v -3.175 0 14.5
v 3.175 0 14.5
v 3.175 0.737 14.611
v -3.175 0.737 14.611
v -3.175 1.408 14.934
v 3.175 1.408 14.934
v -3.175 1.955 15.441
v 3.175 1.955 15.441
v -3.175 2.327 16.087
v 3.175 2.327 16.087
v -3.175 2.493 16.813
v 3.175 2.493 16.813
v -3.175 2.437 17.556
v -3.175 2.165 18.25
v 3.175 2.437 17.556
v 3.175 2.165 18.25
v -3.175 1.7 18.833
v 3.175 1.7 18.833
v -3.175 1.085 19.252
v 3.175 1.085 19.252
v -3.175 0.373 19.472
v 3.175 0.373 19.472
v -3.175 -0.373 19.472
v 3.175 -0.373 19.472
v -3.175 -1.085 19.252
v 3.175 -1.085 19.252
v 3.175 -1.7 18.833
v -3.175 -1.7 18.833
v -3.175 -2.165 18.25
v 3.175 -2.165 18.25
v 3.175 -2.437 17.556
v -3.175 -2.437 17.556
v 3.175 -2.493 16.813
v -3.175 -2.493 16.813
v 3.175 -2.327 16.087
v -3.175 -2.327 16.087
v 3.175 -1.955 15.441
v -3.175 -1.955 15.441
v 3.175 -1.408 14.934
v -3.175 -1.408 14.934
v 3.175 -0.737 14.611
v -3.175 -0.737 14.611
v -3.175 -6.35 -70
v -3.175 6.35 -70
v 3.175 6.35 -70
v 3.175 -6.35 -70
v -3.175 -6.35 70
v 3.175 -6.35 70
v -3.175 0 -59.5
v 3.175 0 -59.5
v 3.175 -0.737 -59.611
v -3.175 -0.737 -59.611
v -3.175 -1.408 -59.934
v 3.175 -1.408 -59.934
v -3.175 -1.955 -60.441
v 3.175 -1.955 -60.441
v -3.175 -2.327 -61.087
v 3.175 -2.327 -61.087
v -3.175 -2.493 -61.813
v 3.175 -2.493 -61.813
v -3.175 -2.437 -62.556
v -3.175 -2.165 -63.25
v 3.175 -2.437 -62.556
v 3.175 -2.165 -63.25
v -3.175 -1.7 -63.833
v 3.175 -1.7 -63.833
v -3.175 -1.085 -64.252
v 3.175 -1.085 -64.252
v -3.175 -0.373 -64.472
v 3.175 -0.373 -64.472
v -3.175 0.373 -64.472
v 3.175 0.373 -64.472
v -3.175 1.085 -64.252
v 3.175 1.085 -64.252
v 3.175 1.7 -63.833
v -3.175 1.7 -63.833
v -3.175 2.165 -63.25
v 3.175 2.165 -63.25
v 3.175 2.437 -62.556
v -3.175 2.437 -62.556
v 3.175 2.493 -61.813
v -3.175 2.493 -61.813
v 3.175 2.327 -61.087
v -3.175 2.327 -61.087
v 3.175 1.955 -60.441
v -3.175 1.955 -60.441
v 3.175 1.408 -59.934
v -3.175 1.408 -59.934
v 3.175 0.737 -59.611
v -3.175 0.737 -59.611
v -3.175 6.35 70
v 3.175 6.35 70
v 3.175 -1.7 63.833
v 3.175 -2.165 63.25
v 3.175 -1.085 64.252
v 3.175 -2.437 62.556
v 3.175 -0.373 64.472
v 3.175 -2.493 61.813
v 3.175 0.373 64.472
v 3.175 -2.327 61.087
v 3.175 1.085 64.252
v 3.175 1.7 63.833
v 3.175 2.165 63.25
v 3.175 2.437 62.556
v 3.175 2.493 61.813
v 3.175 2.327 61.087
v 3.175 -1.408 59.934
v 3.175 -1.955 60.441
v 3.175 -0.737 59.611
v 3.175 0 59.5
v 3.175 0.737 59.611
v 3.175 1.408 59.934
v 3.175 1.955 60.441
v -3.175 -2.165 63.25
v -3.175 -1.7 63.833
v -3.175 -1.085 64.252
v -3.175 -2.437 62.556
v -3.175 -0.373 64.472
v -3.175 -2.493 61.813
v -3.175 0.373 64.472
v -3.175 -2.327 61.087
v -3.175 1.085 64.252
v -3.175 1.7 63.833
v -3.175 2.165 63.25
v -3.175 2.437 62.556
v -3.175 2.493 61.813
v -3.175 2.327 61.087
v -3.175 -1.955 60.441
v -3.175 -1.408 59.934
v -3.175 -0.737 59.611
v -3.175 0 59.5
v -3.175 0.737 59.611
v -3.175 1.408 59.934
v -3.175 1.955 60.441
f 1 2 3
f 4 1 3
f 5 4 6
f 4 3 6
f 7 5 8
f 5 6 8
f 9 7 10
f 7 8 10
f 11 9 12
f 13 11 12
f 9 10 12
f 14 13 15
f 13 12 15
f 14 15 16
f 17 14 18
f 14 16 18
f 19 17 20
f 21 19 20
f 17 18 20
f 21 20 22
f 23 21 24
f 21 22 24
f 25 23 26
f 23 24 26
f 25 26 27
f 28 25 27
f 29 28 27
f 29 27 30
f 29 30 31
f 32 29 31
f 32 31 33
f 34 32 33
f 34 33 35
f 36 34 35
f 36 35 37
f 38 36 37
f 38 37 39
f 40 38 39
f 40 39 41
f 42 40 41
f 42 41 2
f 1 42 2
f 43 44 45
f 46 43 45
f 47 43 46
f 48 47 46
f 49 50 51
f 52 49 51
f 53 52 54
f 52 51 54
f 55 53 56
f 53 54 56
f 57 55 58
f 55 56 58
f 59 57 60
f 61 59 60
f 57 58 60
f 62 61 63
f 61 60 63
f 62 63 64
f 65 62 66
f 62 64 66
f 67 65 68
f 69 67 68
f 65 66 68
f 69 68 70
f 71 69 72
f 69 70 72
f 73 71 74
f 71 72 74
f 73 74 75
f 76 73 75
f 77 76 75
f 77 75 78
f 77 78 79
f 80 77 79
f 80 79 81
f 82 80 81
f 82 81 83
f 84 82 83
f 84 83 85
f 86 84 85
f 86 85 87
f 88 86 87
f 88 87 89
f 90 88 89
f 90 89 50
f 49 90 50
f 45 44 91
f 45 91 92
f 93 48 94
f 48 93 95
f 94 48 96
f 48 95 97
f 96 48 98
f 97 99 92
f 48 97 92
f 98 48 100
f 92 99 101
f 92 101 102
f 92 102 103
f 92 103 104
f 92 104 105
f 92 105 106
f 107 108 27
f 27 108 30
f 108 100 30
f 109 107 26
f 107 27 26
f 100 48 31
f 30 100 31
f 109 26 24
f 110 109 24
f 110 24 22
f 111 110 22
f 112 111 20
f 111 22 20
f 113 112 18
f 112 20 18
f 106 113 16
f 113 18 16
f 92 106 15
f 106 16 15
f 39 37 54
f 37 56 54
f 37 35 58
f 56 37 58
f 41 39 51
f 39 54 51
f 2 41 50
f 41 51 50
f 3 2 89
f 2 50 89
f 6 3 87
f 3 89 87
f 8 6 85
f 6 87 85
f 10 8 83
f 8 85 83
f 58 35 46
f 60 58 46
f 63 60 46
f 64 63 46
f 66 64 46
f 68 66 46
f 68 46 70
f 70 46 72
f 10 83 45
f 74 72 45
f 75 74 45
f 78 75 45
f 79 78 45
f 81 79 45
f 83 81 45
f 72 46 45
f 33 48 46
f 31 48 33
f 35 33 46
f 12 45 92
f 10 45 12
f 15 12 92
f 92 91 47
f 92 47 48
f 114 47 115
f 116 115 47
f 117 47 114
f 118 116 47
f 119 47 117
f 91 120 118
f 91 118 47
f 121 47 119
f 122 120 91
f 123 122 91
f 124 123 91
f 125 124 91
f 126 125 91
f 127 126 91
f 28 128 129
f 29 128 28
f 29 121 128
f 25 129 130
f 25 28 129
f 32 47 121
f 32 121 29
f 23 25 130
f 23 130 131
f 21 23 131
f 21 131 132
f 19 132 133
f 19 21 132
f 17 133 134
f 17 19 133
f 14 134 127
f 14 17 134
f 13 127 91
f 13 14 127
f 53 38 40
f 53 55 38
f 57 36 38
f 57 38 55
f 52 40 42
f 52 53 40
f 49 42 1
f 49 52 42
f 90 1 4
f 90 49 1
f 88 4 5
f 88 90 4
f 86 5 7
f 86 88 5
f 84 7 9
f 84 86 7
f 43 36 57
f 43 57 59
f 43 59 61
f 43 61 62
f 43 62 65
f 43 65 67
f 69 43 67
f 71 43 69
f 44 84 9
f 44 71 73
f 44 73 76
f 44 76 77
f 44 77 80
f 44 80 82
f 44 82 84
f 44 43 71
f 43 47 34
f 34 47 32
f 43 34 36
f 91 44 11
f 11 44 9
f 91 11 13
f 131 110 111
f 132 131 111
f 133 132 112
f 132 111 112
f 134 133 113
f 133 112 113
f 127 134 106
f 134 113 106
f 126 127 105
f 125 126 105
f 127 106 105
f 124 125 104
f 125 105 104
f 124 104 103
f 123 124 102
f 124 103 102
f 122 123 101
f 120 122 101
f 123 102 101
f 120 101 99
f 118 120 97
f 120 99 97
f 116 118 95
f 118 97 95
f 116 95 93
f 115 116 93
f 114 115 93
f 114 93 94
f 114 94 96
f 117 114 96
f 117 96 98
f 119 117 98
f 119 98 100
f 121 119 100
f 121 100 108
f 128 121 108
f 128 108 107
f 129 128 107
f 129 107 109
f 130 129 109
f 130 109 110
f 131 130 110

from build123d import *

# Parameters (mm, degrees)
BOSS_EXTRUDE1_DEPTH      = 70
BOSS_EXTRUDE1_DEPTH_BACK = 70
SKETCH2_W                = 6.35
SKETCH2_H                = 12.7
SKETCH4_R                = 2.5
CUT_EXTRUDE1_DEPTH       = 71.573684897


with BuildPart() as part:
    # Sketch2 → Boss-Extrude1 (new, two sides: drawn at the far end of the back side and taken through both)
    with BuildSketch(Plane.XY.offset(-BOSS_EXTRUDE1_DEPTH_BACK)):
        Rectangle(SKETCH2_W, SKETCH2_H)
    extrude(amount=BOSS_EXTRUDE1_DEPTH + BOSS_EXTRUDE1_DEPTH_BACK)

    # Sketch4 → Cut-Extrude1 (cut, through all)
    with BuildSketch(Plane(origin=(3.175, 0, 0), x_dir=(0, 0, -1), z_dir=(1, 0, 0))):
        with Locations((-62, 0)):
            Circle(SKETCH4_R)
        with Locations((62, 0)):
            Circle(SKETCH4_R)
        with Locations((-17, 0)):
            Circle(SKETCH4_R)
    extrude(amount=-CUT_EXTRUDE1_DEPTH, mode=Mode.SUBTRACT)


solid = part.part
